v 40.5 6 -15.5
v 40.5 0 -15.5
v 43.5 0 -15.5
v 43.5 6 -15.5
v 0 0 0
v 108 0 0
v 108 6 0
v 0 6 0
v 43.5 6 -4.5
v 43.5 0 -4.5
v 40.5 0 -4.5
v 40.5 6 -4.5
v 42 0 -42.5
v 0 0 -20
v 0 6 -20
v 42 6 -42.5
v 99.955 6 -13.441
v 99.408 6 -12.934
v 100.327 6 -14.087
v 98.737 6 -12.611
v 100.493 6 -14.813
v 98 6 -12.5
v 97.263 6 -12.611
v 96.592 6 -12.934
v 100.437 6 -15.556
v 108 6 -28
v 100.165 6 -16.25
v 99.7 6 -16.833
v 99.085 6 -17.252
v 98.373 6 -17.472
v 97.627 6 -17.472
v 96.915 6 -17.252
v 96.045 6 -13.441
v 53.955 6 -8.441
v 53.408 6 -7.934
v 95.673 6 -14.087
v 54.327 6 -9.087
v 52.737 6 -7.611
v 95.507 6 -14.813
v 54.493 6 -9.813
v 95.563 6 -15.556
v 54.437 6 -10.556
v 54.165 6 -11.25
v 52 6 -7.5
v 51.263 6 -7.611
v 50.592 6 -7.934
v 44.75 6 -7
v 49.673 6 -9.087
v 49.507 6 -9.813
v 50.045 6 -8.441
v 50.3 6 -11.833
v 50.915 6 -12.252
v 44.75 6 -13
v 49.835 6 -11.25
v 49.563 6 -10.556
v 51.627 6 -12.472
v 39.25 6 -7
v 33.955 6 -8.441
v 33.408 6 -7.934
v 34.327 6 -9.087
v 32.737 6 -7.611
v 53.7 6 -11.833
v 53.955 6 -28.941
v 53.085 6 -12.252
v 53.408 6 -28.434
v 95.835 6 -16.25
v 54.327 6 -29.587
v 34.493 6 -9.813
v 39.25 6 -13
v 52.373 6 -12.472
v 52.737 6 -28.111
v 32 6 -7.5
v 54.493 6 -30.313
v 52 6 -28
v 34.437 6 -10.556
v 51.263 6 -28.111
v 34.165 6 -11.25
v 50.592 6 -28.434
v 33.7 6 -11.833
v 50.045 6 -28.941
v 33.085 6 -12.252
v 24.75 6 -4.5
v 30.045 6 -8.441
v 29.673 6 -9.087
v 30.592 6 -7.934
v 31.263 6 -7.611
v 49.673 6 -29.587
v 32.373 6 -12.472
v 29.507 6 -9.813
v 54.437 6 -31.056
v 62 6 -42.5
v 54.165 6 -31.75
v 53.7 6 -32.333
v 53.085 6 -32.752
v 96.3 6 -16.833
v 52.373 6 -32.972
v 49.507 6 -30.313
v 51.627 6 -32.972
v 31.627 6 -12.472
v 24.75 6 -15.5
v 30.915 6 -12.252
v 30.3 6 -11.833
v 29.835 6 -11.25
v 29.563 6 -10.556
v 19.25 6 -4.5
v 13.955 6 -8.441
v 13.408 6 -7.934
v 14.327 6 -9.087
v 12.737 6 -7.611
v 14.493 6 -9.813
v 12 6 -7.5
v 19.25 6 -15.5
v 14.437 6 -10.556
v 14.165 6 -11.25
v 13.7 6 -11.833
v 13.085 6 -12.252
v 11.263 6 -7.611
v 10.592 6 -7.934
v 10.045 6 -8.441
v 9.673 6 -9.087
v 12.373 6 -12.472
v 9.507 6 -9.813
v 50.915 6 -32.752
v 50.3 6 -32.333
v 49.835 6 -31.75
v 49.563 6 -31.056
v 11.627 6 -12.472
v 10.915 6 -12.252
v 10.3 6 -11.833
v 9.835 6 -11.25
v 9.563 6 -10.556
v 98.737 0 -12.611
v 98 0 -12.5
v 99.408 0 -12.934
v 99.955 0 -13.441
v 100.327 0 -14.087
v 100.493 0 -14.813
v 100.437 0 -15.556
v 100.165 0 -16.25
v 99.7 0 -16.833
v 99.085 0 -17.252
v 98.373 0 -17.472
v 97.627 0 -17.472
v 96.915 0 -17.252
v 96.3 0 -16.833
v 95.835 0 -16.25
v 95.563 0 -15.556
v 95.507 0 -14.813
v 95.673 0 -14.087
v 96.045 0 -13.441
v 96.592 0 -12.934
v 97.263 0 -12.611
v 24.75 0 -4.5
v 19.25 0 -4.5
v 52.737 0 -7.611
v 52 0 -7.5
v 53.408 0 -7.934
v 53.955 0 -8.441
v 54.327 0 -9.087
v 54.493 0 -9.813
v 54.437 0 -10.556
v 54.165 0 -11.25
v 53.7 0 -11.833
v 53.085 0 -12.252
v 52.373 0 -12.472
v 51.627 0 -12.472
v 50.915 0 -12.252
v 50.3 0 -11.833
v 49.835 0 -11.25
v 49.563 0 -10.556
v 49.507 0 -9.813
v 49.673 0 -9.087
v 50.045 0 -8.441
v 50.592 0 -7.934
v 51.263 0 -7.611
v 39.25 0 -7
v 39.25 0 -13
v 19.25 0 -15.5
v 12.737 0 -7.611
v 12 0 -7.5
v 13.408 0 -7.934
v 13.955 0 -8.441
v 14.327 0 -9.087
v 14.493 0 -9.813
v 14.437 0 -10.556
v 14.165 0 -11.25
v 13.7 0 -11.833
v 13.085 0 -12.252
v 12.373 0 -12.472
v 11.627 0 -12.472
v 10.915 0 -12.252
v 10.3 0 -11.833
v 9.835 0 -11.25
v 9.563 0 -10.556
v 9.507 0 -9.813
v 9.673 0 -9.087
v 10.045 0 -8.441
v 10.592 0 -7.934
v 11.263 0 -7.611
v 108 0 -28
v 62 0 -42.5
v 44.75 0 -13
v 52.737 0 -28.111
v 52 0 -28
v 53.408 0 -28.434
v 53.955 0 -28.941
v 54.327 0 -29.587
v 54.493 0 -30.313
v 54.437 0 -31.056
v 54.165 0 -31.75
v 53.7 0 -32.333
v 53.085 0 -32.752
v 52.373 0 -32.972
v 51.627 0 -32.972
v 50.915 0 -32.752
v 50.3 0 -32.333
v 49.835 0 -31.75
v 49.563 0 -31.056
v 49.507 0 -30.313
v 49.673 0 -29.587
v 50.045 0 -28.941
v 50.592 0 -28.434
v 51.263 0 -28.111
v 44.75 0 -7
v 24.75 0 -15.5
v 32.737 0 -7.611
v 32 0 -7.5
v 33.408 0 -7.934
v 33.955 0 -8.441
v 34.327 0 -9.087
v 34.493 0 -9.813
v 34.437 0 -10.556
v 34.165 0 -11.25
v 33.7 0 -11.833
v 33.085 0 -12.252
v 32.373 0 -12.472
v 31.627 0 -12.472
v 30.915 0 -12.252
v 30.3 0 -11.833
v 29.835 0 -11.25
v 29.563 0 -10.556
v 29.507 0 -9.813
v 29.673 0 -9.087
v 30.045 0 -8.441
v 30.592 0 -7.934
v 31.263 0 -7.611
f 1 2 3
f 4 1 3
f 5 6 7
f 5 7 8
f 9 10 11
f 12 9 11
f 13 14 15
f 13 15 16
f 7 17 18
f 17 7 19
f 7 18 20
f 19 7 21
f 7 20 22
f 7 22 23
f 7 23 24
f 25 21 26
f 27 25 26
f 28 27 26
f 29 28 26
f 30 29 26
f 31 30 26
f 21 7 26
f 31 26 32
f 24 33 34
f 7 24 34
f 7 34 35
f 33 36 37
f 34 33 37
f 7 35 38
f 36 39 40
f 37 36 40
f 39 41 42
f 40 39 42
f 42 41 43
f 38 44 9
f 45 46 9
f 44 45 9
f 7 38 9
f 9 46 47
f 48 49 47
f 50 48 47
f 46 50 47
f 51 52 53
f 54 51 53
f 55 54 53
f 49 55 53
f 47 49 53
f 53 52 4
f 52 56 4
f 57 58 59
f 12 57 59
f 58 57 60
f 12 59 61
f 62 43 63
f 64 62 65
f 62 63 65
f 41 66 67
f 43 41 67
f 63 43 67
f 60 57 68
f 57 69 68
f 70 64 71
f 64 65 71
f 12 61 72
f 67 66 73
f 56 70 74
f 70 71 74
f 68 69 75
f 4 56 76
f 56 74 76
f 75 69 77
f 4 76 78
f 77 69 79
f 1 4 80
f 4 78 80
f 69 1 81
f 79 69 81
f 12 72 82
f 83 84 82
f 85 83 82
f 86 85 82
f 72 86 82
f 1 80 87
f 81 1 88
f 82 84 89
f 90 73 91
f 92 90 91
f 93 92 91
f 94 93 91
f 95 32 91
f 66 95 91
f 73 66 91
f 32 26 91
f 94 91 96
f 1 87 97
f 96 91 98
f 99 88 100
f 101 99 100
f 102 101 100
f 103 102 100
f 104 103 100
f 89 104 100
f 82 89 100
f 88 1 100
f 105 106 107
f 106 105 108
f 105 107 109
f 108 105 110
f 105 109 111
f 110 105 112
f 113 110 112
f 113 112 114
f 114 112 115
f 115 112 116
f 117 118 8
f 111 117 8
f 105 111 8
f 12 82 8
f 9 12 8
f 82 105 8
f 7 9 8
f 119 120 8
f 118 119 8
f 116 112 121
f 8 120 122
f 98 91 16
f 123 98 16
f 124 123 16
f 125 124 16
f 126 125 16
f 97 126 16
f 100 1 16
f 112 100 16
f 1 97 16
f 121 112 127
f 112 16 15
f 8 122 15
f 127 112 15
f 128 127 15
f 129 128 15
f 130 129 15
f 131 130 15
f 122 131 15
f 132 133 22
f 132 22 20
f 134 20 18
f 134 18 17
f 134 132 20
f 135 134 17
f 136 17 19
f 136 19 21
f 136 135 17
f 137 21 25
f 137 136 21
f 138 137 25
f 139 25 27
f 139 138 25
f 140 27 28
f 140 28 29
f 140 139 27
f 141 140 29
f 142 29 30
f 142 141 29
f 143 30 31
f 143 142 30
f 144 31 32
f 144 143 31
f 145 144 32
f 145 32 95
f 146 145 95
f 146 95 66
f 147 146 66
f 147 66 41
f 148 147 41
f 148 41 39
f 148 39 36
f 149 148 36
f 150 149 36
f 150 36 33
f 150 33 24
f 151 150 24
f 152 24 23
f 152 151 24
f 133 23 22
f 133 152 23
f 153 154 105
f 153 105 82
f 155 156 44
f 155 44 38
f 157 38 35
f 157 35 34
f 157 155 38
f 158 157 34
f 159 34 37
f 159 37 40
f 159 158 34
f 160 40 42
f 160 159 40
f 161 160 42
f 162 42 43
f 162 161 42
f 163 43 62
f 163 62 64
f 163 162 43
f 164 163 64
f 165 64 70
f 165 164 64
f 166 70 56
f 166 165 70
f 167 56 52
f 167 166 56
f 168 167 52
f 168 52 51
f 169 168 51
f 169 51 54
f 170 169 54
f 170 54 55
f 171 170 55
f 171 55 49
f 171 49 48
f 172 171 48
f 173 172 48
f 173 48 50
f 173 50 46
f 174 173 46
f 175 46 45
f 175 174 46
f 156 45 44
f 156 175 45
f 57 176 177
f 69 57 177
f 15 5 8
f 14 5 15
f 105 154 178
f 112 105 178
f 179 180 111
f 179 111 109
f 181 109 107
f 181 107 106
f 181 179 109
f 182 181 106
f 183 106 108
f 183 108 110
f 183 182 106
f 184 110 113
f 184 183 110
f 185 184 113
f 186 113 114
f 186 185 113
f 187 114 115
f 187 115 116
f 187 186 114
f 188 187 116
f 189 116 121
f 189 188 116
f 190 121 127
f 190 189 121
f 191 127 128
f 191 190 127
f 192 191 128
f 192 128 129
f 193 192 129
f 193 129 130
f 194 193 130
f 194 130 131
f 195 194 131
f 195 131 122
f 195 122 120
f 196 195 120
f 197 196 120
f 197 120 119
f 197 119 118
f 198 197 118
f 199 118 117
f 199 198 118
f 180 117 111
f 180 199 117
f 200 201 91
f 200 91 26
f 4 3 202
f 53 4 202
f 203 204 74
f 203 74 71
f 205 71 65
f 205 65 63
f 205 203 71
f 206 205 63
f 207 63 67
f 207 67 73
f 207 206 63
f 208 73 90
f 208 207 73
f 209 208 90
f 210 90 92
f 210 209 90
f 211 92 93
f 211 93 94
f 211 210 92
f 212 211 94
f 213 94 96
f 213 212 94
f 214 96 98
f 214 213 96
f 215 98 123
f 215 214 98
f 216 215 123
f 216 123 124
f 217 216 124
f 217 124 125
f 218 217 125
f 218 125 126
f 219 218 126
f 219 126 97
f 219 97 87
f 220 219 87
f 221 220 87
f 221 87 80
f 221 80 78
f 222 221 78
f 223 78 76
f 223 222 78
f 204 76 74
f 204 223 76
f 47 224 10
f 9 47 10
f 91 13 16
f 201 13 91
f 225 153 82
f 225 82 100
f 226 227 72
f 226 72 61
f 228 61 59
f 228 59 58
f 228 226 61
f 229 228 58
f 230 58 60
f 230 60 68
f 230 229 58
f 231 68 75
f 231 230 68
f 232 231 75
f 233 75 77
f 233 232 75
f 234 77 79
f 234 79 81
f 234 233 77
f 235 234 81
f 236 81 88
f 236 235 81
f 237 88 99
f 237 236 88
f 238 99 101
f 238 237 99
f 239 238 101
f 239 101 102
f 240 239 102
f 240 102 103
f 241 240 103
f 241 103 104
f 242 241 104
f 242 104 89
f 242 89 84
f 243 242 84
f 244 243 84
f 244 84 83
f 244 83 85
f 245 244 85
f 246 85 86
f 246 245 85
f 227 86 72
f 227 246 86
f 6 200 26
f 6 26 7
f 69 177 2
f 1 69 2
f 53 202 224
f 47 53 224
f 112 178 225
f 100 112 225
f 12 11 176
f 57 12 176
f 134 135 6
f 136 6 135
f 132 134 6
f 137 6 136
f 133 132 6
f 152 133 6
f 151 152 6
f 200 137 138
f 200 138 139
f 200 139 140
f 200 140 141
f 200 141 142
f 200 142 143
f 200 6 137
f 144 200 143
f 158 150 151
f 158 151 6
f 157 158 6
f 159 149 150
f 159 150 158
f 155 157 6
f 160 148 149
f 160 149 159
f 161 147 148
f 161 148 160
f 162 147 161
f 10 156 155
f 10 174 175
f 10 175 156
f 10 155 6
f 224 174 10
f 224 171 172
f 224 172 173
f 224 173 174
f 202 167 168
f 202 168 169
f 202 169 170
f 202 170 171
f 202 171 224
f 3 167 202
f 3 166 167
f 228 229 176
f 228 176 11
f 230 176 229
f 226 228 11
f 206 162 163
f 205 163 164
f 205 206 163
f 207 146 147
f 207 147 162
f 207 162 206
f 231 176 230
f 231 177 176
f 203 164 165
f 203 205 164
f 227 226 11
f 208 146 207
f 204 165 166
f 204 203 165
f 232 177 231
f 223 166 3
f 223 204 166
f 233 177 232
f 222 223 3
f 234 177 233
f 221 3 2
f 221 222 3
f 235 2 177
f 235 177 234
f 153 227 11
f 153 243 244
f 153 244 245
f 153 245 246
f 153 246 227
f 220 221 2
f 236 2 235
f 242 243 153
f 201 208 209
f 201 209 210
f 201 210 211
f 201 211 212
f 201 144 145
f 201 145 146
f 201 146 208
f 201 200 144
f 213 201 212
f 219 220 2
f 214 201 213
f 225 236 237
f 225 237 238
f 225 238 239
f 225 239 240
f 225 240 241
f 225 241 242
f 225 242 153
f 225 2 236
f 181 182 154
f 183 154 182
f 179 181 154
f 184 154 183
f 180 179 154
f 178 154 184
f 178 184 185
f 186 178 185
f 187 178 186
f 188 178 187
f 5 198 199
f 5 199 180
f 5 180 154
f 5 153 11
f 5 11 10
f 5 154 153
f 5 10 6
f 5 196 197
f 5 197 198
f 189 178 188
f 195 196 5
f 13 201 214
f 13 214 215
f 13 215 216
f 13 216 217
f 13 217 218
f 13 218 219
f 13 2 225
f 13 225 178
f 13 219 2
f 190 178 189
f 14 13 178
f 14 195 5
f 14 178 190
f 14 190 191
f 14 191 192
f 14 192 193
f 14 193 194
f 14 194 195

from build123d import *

# Parameters (mm, degrees)
SKETCH1_R           = 2.5
SKETCH1_W           = 5.5
SKETCH1_H           = 11
BOSS_EXTRUDE1_DEPTH = 6


with BuildPart() as part:
    # Sketch1 → Boss-Extrude1 (new body)
    with BuildSketch(Plane(origin=(0, 0, 0), x_dir=(1, 0, 0), z_dir=(0, 1, 0))):
        Polygon((0, 0), (0, 20), (42, 42.5), (62, 42.5), (108, 28), (108, 0), align=None)
        with Locations(Location((52, 30.5, 0), (0, 0, 270))):
            Circle(SKETCH1_R, mode=Mode.SUBTRACT)
        with Locations(Location((52, 10, 0), (0, 0, 270))):
            Circle(SKETCH1_R, mode=Mode.SUBTRACT)
        with Locations(Location((32, 10, 0), (0, 0, 270))):
            Circle(SKETCH1_R, mode=Mode.SUBTRACT)
        with Locations(Location((12, 10, 0), (0, 0, 270))):
            Circle(SKETCH1_R, mode=Mode.SUBTRACT)
        with Locations(Location((98, 15, 0), (0, 0, 270))):
            Circle(SKETCH1_R, mode=Mode.SUBTRACT)
        with Locations((22, 10)):
            Rectangle(SKETCH1_W, SKETCH1_H, mode=Mode.SUBTRACT)
        Polygon((40.5, 15.5), (43.5, 15.5), (44.75, 13), (44.75, 7), (43.5, 4.5), (40.5, 4.5), (39.25, 7), (39.25, 13), align=None, mode=Mode.SUBTRACT)
    extrude(amount=BOSS_EXTRUDE1_DEPTH)


solid = part.part
